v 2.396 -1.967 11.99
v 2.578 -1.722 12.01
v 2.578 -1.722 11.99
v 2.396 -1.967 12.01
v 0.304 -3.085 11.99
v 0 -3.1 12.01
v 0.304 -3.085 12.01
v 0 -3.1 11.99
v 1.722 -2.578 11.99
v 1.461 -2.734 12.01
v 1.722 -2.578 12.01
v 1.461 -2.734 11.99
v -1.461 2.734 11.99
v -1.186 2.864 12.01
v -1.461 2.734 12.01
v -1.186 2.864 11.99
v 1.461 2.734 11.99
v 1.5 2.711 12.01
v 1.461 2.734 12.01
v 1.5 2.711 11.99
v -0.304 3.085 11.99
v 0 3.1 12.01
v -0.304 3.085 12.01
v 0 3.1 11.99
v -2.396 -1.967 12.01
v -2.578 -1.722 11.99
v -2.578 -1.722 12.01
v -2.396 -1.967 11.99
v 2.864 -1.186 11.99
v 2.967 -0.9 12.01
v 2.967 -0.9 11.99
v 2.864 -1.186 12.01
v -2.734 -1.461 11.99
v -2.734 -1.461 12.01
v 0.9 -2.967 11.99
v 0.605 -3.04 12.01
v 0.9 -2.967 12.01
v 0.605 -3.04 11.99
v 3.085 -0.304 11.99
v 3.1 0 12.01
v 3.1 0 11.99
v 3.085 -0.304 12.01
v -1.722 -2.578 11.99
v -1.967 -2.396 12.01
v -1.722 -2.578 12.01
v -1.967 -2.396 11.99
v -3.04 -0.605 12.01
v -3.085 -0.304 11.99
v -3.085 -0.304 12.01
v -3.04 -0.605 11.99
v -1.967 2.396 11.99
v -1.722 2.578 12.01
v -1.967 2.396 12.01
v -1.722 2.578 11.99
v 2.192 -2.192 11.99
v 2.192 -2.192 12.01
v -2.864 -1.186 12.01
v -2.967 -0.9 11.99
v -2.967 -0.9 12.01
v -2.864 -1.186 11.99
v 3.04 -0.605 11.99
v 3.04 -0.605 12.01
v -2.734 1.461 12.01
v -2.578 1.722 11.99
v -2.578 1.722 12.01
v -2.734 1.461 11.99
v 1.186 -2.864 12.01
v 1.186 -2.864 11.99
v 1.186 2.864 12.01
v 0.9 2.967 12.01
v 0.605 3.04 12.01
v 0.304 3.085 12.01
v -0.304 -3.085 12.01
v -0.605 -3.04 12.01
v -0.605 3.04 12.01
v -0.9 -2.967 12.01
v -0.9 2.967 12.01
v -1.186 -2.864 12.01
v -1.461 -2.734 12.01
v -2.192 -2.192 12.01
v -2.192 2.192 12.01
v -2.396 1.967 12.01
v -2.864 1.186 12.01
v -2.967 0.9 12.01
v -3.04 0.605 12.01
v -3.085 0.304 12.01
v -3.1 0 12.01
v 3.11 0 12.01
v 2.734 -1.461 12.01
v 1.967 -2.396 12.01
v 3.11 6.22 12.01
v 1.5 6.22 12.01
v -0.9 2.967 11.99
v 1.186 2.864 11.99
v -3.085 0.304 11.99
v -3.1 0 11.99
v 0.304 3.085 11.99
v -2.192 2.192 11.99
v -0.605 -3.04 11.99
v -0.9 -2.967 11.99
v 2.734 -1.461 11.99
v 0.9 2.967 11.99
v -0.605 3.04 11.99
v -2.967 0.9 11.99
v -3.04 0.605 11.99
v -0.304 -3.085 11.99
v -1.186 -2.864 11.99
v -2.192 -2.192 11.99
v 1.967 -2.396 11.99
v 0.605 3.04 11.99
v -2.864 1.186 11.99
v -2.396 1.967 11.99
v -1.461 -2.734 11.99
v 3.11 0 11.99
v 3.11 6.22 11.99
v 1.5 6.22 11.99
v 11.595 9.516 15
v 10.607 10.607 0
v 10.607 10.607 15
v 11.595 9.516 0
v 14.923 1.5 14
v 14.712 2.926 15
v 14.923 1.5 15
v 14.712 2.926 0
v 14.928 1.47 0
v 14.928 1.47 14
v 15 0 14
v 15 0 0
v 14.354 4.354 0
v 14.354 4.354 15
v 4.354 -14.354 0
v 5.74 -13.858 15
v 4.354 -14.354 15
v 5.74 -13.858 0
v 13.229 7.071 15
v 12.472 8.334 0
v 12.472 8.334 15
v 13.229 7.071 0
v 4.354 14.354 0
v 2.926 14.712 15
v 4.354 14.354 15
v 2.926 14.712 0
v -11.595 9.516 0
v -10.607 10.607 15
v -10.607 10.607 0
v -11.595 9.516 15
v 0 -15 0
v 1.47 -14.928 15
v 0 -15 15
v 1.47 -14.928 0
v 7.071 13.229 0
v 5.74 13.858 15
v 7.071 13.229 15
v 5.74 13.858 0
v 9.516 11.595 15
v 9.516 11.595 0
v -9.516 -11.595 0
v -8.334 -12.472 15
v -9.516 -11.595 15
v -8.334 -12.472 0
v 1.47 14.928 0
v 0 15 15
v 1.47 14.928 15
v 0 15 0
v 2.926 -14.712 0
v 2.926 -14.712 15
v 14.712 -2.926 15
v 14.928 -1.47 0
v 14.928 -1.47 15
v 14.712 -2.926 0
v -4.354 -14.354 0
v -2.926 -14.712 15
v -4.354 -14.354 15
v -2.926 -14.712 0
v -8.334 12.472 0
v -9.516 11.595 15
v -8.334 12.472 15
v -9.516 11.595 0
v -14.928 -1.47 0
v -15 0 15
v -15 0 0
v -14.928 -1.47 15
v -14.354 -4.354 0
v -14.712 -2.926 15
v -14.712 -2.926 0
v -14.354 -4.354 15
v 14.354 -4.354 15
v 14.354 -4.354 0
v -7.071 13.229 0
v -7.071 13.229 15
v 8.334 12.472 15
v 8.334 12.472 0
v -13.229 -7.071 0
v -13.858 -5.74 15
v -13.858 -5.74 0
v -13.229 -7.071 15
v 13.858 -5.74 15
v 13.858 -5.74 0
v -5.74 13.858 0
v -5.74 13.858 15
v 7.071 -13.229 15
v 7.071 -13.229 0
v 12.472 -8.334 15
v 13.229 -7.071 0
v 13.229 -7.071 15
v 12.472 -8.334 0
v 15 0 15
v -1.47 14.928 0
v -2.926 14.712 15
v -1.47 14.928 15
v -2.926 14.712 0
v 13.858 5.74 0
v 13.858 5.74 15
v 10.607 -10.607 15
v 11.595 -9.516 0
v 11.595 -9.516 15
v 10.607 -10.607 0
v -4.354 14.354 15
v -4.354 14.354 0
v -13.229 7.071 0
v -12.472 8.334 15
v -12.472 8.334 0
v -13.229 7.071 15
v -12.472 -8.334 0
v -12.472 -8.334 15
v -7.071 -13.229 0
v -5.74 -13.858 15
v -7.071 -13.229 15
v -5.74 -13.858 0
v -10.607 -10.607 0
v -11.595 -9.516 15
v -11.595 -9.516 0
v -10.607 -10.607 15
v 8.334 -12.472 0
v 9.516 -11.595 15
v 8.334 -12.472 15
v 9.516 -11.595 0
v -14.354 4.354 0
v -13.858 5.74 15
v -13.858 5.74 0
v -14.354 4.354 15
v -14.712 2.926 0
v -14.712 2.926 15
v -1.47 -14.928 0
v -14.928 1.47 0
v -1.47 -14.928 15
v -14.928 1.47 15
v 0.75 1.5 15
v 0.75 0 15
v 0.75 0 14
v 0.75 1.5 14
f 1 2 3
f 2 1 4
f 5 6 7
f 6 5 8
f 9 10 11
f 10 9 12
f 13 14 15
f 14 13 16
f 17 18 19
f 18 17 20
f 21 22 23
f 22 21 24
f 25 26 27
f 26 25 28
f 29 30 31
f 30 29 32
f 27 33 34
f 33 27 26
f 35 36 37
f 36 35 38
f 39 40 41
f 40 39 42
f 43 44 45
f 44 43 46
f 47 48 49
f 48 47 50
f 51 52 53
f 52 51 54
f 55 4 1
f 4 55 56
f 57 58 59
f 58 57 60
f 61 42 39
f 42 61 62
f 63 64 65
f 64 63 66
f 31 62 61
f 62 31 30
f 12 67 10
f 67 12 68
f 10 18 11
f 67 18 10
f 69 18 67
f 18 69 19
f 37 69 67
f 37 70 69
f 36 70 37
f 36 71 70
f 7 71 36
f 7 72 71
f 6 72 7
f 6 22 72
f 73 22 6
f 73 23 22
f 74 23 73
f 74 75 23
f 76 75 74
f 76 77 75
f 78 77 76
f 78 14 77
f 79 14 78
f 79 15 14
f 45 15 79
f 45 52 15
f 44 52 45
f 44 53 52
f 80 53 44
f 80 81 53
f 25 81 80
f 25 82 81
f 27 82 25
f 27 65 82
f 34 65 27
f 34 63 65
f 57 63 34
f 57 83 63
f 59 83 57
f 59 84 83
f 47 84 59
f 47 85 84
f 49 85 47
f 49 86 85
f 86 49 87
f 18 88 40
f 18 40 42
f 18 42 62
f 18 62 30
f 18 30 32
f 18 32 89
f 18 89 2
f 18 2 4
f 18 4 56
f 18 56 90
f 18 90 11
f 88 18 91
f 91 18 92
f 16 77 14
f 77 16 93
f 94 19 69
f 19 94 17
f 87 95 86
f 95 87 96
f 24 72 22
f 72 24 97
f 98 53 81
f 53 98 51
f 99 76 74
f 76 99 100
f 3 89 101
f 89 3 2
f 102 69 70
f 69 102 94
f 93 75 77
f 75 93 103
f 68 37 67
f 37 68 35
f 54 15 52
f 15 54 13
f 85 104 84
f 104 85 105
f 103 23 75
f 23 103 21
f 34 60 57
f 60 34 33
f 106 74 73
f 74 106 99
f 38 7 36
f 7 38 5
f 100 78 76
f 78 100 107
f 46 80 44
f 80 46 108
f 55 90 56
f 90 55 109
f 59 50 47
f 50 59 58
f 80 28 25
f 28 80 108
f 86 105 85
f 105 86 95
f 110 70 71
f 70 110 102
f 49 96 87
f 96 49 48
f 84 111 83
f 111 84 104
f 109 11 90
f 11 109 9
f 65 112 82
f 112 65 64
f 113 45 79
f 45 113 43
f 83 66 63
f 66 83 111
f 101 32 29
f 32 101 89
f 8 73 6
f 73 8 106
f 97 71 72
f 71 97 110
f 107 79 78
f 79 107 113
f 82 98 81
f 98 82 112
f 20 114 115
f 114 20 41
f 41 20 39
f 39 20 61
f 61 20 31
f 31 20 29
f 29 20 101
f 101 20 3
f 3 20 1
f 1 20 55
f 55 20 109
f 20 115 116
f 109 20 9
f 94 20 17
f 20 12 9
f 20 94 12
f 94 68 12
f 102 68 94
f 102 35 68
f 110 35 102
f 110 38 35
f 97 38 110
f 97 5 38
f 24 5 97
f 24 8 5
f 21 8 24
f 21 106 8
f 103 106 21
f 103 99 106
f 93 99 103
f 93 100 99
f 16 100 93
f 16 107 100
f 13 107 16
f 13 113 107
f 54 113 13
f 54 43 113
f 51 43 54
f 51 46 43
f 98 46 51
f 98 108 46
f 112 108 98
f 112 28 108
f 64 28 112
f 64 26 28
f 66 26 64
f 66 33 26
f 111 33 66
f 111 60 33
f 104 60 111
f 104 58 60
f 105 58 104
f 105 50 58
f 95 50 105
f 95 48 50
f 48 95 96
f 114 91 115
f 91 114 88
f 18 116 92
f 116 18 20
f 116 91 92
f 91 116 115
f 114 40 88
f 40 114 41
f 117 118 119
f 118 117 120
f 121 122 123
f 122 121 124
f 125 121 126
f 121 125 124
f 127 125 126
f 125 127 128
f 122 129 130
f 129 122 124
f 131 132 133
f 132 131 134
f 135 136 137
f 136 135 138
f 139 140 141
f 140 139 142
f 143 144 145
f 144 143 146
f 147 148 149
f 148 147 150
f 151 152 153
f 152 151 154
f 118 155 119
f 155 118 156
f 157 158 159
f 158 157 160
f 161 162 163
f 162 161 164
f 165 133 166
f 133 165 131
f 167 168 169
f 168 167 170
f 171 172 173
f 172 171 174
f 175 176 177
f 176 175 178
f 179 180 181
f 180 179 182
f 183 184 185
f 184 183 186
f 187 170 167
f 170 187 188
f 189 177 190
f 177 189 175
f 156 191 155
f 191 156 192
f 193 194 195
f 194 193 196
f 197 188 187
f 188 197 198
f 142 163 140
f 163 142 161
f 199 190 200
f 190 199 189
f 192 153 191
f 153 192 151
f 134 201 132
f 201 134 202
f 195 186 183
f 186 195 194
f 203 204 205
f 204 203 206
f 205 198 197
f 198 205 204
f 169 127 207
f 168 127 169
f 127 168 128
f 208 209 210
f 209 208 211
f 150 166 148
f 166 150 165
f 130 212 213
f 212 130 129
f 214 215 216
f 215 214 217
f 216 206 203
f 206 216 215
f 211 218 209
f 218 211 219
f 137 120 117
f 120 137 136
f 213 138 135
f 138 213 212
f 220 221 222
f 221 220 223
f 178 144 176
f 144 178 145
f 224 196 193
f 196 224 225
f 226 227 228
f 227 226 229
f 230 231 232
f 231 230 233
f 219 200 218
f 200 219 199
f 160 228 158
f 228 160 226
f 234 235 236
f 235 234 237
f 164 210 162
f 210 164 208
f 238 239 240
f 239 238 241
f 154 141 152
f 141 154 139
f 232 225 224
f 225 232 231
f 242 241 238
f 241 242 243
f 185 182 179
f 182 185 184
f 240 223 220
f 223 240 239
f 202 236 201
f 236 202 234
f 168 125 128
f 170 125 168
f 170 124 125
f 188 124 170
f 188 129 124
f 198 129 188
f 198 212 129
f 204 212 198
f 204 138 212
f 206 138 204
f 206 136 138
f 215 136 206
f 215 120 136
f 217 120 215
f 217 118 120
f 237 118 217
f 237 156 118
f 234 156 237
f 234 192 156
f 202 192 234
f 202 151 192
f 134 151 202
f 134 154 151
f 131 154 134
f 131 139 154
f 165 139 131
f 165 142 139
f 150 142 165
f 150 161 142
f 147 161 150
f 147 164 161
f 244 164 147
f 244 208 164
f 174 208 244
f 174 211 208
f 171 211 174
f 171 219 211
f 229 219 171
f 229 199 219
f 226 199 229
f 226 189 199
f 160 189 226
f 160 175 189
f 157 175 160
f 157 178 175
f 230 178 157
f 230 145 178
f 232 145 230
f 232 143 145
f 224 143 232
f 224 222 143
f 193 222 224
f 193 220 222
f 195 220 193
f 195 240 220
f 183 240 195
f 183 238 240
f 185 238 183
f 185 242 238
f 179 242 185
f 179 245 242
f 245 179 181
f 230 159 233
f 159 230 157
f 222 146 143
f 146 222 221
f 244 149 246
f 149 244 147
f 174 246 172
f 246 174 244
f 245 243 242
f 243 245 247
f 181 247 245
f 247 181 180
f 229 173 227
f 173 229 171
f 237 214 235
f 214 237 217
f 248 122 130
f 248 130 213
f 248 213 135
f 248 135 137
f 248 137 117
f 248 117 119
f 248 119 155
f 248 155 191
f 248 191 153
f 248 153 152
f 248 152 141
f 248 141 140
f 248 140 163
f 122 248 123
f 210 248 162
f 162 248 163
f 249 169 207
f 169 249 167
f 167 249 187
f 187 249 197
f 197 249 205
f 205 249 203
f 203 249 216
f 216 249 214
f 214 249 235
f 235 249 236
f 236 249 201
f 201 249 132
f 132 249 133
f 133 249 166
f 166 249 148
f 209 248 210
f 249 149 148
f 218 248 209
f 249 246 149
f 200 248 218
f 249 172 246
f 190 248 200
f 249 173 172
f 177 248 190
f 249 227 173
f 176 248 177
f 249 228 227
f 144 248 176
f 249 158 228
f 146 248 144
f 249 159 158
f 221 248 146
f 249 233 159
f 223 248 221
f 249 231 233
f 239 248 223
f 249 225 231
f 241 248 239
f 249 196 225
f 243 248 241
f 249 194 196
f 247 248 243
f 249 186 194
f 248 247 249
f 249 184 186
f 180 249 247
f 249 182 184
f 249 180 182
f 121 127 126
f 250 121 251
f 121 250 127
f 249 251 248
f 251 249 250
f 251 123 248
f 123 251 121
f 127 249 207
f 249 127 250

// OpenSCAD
// Replacement knob for hotplate stirrer
// D-shaft: 6 mm, Knob: 30 mm dia x 15 mm tall, printed with bottom face on bed (z=0)

// --- Knob outer dimensions ---
knob_dia = 30;           // Outer diameter of knob (mm)
knob_h = 15;             // Total height of knob (mm)
knob_r = knob_dia / 2;  // Outer radius

// --- D-shaft bore dimensions ---
shaft_dia = 6;           // Shaft diameter (mm)
bore_dia = 6.2;           // Bore diameter (slight clearance) (mm)
bore_r = bore_dia / 2;   // Bore radius
bore_depth = 12;         // Depth of blind bore from bottom (mm)
flat_to_opposite = 4.7;  // Distance from flat to opposite side of circle (mm)

// --- Calculated values ---
// For D-shape: the flat is cut such that distance from flat to opposite side = 4.7 mm
// The circle has radius 3.1 mm. The flat is at distance (3.1 - (4.7 - 3.1)) = 1.5 mm from center
// So the flat is at x = 1.5 mm (if flat is on the right side)
flat_offset = bore_r - (flat_to_opposite - bore_r);  // Distance from center to flat

// --- Grip grooves ---
num_grooves = 18;         // Number of vertical grip grooves
groove_dia = 2;           // Diameter of half-cylinder groove (mm)
groove_r = groove_dia / 2;

// --- Pointer groove ---
pointer_width = 1.5;      // Width of pointer groove (mm)
pointer_depth = 1;       // Depth of pointer groove (mm)

// --- Build the knob with all features ---
difference() {
    // Main cylinder body
    cylinder(r = knob_r, h = knob_h, $fn = 64);
    
    // Subtract D-shaped blind bore from bottom (z=0)
    // The bore goes 12mm up into the knob
    translate([0, 0, bore_depth - 0.01]) {
        // First, create the cylindrical part of the bore
        cylinder(r = bore_r, h = 0.02, $fn = 64);
        
        // Then cut the flat side
        // The flat is at x = flat_offset, cutting from there to the right
        translate([flat_offset, 0, 0]) {
            // Cut a rectangular section to create the flat
            cube([bore_r - flat_offset + 0.01, bore_dia + 0.02, 0.02], center = [0, 0, 0]);
        }
    }
    
    // Subtract vertical grip grooves (half-cylinders on outer surface)
    for (i = [0 : num_grooves - 1]) {
        angle = i * 360 / num_grooves;
        translate([cos(angle) * knob_r, sin(angle) * knob_r, 0]) {
            rotate([0, 0, angle]) {
                // Half-cylinder groove: cut from the outer surface inward
                // The groove center is on the outer surface, so we cut from r = knob_r - groove_r inward
                translate([groove_r, 0, 0]) {
                    cylinder(r = groove_r, h = knob_h + 0.02, $fn = 32);
                }
            }
        }
    }
    
    // Subtract pointer groove on top face
    // Runs from center to outer edge, on the same side as the flat of the D (positive x-axis)
    translate([0, 0, knob_h - pointer_depth]) {
        // Rectangular groove from center to edge
        translate([pointer_width / 2, 0, 0]) {
            cube([knob_r, pointer_width, pointer_depth + 0.01], center = [0, 0, 0]);
        }
    }
}
